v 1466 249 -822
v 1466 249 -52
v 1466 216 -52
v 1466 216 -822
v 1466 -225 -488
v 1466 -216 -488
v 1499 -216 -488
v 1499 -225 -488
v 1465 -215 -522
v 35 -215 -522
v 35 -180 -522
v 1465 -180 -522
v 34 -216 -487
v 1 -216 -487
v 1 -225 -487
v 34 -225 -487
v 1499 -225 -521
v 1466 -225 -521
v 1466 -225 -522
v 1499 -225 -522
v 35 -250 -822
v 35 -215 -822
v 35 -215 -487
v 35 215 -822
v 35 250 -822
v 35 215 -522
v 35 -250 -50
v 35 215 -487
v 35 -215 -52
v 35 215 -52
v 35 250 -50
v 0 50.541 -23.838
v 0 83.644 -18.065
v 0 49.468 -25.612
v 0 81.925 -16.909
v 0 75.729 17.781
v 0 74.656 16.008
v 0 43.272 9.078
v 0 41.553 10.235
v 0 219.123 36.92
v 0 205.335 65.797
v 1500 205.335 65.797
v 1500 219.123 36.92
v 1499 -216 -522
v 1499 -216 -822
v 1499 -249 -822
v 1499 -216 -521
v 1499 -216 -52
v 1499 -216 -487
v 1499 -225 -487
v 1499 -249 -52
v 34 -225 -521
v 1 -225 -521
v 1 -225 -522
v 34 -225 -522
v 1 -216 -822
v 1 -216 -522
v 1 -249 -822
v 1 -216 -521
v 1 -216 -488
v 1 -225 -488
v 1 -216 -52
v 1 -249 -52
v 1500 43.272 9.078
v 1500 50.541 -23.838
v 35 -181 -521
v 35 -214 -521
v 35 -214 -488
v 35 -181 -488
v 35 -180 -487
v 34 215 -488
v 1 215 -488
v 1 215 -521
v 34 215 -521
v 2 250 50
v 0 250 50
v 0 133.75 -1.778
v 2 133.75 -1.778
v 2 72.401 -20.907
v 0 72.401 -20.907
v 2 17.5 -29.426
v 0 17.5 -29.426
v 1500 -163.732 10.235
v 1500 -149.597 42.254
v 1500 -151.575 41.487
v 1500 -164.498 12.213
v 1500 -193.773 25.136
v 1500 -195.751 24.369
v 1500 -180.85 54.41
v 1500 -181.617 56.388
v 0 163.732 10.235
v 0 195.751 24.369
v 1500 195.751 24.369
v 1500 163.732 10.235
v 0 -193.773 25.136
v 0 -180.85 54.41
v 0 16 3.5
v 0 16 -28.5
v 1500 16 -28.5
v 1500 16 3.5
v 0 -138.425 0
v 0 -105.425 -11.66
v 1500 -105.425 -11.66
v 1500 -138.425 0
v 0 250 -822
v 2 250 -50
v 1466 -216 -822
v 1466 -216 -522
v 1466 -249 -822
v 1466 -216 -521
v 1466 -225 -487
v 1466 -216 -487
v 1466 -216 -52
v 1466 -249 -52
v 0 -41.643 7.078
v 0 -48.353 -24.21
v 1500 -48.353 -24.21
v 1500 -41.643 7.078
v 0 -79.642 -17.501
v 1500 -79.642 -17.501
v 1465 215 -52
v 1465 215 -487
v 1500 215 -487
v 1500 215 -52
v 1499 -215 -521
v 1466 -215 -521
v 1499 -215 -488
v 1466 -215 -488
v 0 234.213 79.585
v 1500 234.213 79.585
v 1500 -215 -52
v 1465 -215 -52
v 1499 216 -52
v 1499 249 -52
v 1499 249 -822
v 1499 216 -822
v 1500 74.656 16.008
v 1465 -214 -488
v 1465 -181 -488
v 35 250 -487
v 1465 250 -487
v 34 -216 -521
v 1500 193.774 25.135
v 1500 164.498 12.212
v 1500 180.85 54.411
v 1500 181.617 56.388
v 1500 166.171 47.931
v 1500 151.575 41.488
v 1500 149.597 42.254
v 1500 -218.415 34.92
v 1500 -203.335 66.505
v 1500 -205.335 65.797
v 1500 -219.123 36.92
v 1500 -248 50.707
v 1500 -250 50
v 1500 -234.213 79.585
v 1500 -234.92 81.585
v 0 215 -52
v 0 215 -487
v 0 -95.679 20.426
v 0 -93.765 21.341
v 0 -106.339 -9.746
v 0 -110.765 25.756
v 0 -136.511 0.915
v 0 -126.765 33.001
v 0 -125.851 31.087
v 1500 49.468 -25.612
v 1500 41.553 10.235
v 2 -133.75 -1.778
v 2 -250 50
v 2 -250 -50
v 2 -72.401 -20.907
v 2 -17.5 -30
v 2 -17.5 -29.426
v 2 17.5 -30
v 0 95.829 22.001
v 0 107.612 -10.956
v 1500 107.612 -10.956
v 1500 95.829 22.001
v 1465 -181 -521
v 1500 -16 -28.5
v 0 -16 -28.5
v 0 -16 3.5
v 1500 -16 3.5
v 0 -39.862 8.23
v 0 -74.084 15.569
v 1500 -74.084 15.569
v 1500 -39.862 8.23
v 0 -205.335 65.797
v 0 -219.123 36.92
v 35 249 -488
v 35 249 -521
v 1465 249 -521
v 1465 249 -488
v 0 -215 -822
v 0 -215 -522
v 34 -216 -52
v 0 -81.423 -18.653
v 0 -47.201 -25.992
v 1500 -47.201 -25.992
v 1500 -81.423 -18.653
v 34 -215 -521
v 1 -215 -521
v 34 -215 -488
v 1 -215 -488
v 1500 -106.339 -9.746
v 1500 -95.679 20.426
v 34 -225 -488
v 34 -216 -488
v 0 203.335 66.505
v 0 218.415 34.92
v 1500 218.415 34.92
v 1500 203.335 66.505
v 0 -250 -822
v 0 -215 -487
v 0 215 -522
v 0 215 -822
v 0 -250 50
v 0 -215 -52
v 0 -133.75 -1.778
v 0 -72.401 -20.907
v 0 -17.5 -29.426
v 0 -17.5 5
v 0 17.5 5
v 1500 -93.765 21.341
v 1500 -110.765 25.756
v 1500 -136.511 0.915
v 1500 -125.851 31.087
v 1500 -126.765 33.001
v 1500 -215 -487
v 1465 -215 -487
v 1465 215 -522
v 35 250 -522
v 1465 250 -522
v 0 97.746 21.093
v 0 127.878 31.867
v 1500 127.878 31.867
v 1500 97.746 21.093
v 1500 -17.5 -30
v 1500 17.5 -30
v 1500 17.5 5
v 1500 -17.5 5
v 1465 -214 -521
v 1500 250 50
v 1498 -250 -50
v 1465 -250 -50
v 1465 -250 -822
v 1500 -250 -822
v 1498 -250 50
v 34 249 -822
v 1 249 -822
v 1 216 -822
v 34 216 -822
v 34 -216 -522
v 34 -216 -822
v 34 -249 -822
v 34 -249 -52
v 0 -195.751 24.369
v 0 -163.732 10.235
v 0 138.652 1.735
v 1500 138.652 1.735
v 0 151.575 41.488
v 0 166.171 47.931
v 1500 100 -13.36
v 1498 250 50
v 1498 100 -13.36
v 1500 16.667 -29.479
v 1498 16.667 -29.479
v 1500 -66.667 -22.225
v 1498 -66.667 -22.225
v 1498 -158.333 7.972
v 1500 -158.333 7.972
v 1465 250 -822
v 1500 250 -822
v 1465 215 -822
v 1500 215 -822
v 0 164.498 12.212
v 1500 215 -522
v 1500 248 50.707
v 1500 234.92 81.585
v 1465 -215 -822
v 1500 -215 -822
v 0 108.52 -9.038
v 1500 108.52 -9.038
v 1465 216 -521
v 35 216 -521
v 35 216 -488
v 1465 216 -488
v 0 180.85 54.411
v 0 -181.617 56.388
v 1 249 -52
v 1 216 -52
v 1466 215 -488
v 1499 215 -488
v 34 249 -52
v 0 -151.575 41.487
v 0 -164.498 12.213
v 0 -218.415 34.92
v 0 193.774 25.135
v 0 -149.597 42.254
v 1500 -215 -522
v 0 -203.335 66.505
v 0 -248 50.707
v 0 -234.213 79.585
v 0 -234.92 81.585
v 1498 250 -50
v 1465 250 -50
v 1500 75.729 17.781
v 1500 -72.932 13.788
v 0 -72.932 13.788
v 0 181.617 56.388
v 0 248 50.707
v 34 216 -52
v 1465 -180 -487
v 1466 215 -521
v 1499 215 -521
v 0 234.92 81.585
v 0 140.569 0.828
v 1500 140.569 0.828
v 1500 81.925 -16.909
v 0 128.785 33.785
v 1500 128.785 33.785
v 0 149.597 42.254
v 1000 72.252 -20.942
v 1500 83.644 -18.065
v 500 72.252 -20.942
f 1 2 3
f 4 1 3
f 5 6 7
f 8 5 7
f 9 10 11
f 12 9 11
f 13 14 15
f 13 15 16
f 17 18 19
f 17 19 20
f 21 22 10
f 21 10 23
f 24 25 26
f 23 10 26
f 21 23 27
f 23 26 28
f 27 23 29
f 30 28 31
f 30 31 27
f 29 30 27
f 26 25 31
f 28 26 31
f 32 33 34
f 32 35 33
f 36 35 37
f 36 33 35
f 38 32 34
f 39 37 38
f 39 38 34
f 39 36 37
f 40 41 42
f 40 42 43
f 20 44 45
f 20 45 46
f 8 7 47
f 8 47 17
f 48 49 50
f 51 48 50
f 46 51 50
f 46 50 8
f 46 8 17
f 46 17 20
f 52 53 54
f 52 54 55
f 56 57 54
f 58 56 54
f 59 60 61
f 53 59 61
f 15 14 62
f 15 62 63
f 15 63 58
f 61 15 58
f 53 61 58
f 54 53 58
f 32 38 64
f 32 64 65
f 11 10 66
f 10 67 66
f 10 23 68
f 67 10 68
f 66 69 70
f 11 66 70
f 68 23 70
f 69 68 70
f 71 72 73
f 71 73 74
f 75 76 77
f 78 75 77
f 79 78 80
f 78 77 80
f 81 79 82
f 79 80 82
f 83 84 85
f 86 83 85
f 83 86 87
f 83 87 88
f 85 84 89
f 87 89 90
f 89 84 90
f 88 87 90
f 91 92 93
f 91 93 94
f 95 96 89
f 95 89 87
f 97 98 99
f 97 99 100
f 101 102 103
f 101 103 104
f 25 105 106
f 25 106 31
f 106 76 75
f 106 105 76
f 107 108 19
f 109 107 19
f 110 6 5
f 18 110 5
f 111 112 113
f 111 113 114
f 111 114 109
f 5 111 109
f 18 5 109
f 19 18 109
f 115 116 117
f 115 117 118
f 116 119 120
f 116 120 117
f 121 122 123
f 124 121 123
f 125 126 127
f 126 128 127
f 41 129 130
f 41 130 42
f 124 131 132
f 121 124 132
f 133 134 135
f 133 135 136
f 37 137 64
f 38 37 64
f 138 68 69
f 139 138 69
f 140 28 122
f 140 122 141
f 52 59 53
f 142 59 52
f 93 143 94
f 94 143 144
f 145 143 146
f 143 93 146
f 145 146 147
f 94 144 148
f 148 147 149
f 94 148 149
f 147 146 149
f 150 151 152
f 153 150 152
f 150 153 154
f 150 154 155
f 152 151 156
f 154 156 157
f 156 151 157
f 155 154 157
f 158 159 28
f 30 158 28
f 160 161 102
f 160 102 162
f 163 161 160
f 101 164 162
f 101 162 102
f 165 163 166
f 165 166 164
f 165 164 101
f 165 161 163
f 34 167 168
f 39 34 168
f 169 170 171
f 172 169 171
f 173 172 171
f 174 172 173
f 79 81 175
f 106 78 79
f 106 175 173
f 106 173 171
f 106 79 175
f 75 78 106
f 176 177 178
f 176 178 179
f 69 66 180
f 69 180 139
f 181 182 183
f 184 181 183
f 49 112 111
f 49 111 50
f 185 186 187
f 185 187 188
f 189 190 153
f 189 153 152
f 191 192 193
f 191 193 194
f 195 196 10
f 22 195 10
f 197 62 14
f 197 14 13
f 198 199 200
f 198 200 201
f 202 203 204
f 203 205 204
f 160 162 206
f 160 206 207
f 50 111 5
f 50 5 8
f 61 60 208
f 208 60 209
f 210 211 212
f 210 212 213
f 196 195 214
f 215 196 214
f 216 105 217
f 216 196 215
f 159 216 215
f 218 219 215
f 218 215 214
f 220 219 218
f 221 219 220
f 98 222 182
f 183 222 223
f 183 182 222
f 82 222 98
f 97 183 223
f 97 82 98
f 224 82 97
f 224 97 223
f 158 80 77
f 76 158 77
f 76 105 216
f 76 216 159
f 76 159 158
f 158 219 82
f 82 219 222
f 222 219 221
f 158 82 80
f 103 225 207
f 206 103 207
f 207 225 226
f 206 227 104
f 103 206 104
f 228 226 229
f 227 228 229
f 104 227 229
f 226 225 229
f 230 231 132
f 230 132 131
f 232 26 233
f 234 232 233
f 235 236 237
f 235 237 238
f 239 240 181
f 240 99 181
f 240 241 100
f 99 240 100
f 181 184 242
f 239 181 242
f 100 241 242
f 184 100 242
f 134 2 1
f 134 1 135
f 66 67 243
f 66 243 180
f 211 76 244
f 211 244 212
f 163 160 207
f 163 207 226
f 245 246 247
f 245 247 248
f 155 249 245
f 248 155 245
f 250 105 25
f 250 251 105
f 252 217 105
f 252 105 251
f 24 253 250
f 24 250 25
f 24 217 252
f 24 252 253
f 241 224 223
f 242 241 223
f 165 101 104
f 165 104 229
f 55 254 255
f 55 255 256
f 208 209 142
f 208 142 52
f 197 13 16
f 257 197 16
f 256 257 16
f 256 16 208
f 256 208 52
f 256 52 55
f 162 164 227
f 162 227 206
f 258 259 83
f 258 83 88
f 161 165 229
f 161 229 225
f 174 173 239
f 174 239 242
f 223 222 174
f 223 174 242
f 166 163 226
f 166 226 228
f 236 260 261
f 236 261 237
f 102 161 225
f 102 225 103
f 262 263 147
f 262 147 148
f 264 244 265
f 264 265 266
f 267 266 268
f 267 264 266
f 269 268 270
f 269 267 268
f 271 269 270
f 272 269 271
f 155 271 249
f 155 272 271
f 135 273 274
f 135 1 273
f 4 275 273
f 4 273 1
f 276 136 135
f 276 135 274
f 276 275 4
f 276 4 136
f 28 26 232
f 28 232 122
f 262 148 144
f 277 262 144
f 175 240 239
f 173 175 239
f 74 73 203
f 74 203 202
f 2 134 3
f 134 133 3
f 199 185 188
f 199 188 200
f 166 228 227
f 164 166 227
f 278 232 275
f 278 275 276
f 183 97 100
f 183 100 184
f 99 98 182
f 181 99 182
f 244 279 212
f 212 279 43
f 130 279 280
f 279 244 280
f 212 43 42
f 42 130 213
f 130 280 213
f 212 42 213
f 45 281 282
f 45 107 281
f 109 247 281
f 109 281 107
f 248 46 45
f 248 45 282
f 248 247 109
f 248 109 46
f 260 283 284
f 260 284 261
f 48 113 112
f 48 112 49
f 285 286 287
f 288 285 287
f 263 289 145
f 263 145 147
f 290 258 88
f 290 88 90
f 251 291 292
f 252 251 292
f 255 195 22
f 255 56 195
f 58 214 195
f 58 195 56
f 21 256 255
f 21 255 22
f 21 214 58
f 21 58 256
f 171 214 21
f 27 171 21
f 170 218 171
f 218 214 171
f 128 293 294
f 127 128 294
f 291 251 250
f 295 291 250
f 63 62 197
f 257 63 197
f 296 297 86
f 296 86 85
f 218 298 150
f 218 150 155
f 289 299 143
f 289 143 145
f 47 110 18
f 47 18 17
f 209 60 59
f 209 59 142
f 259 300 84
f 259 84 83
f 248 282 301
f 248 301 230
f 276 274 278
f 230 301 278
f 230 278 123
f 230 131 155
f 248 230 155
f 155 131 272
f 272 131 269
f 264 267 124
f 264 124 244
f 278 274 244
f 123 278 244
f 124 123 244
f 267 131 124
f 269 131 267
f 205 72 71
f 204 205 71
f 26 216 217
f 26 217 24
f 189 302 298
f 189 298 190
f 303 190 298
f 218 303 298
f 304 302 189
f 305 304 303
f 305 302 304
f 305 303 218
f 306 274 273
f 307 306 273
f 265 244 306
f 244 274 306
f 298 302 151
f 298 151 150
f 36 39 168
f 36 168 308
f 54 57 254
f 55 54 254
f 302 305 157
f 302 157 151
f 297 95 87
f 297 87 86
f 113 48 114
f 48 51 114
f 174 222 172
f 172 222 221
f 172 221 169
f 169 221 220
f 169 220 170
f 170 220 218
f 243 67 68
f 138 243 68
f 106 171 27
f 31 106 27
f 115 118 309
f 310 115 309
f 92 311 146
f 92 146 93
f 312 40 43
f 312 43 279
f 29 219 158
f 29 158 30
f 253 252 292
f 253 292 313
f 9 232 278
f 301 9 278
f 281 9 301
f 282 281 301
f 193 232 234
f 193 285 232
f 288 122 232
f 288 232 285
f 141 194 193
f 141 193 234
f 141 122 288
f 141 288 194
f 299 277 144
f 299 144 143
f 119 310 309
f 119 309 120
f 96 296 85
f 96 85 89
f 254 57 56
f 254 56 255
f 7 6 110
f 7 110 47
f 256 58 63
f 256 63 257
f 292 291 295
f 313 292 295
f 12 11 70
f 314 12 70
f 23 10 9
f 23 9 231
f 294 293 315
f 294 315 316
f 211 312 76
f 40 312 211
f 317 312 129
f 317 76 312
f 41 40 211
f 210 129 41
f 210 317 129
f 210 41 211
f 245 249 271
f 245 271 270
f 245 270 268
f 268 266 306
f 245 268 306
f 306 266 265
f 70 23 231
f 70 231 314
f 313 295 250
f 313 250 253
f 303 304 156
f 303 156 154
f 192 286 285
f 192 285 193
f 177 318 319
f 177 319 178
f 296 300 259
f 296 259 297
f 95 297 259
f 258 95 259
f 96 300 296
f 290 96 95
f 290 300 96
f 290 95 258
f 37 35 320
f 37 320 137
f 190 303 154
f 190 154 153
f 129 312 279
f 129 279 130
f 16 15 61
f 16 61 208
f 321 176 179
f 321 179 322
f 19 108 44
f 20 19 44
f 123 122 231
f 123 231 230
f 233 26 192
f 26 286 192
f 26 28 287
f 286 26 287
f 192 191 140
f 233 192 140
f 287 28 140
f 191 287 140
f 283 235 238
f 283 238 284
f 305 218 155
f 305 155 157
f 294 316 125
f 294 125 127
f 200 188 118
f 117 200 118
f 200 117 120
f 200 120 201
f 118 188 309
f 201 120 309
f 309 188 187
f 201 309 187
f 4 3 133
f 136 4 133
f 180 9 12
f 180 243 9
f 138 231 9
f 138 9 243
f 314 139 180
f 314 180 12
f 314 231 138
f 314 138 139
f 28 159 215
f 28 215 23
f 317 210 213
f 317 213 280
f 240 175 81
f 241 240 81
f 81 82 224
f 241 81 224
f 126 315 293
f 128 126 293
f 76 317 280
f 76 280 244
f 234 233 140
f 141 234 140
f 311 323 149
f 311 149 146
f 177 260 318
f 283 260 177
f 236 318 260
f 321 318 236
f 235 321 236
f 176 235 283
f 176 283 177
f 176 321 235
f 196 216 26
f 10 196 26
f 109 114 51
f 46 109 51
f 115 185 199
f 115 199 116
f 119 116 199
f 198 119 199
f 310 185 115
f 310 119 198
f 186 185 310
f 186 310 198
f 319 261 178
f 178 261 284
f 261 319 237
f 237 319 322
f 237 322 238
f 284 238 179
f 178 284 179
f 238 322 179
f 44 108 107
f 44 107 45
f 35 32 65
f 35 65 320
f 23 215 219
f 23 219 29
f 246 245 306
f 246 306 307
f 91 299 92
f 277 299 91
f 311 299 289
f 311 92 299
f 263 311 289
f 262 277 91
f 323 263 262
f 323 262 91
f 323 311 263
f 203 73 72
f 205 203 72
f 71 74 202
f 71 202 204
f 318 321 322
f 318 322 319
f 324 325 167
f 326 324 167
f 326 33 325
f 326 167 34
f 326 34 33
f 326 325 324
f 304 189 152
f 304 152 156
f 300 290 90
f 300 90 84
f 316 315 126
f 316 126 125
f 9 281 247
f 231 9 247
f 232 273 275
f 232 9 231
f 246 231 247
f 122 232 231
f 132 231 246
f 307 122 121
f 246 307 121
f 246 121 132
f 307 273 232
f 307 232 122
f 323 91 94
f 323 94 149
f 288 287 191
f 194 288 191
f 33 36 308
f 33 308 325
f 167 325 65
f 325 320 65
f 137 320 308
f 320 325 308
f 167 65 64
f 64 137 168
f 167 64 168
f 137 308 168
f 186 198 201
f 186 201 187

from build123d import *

# Parameters (mm, degrees)
F1_DEPTH  = 2
F2_W      = 35
F2_H      = 500
F3_DEPTH  = 2
F6_W      = 35
F6_H      = 35
F6_W_2    = 32
F6_H_2    = 32
F7_DEPTH  = 1500
F9_DEPTH  = 1500
F11_DEPTH = 1500
F13_DEPTH = 1500
F14_W     = 35
F14_H     = 35
F14_W_2   = 33
F14_H_2   = 33
F15_DEPTH = 770
F16_W     = 35
F16_H     = 35
F16_W_2   = 33
F16_H_2   = 33
F17_DEPTH = 770
F18_W     = 35
F18_H     = 35
F18_W_2   = 33
F18_H_2   = 33
F19_DEPTH = 440
F20_W     = 35
F20_H     = 35
F20_W_2   = 33
F20_H_2   = 33
F21_DEPTH = 440
F22_W     = 35
F22_H     = 35
F22_W_2   = 33
F22_H_2   = 33
F23_DEPTH = 1430
F24_W     = 35
F24_H     = 35
F24_W_2   = 33
F24_H_2   = 33
F25_DEPTH = 1430


with BuildPart() as f1:
    # F0 (on Right) → F1 (new body)
    with BuildSketch(Plane.YZ):
        with BuildLine():
            Line((-250, 50), (-250, -50))
            Line((-250, -50), (250, -50))
            Line((250, -50), (250, 50))
            add(Edge.make_bspline(
                [(250, 50), (166.6666666667, 10), (0, -70), (-166.6666666667, 10), (-250, 50)],
                knots=[0, 0, 0, 0, 0.5, 1, 1, 1, 1], degree=3))
        make_face()
    extrude(amount=F1_DEPTH)

    # F2 (on face) → F3 (join)
    with BuildSketch(Plane(origin=(0, 0, -50), x_dir=(1, 0, 0), z_dir=(0, 0, -1))):
        with Locations((17.5, 0)):
            Rectangle(F2_W, F2_H)
    extrude(amount=F3_DEPTH)


with BuildPart() as f4_1:
    # F4: instance of F1
    add(f1.part.mirror(Plane(origin=(35, 0, -51), x_dir=(0, 1, 0), z_dir=(1, 0, 0))))


with BuildPart() as f4_1_1:
    # F5: moved
    add(f4_1.part.moved(Location((1430, 0, 0))))

    # F16 (on face) → F17 (join)
    with BuildSketch(Plane(origin=(0, 0, -52), x_dir=(1, 0, 0), z_dir=(0, 0, -1))):
        with Locations((1482.5, 232.5)):
            Rectangle(F16_W, F16_H)
        with Locations((1482.5, 232.5)):
            Rectangle(F16_W_2, F16_H_2, mode=Mode.SUBTRACT)
        with Locations((1482.5, -232.5)):
            Rectangle(F16_W, F16_H)
        with Locations((1482.5, -232.5)):
            Rectangle(F16_W_2, F16_H_2, mode=Mode.SUBTRACT)
    extrude(amount=F17_DEPTH)

    # F18 (on face) → F19 (join)
    with BuildSketch(Plane.XZ.offset(-215)):
        with Locations((1482.5, -504.5)):
            Rectangle(F18_W, F18_H)
        with Locations((1482.5, -504.5)):
            Rectangle(F18_W_2, F18_H_2, mode=Mode.SUBTRACT)
    extrude(amount=F19_DEPTH)


with BuildPart() as f1_1:
    add(f1.part)

    # F6 (on face) → F7 (join)
    with BuildSketch(Plane(origin=(0, 0, 0), x_dir=(0, -1, 0), z_dir=(-1, 0, 0))):
        with Locations((0, -12.5)):
            Rectangle(F6_W, F6_H)
        with Locations((0, -12.5)):
            Rectangle(F6_W_2, F6_H_2, mode=Mode.SUBTRACT)
    extrude(amount=-F7_DEPTH)

    # F14 (on face) → F15 (join)
    with BuildSketch(Plane(origin=(0, 0, -52), x_dir=(1, 0, 0), z_dir=(0, 0, -1))):
        with Locations((17.5, 232.5)):
            Rectangle(F14_W, F14_H)
        with Locations((17.5, 232.5)):
            Rectangle(F14_W_2, F14_H_2, mode=Mode.SUBTRACT)
        with Locations((17.5, -232.5)):
            Rectangle(F14_W, F14_H)
        with Locations((17.5, -232.5)):
            Rectangle(F14_W_2, F14_H_2, mode=Mode.SUBTRACT)
    extrude(amount=F15_DEPTH)

    # F20 (on face) → F21 (join)
    with BuildSketch(Plane.XZ.offset(-215)):
        with Locations((17.5, -504.5)):
            Rectangle(F20_W, F20_H)
        with Locations((17.5, -504.5)):
            Rectangle(F20_W_2, F20_H_2, mode=Mode.SUBTRACT)
    extrude(amount=F21_DEPTH)


with BuildPart() as f9:
    # F8 (on face) → F9 (new body)
    with BuildSketch(Plane(origin=(0, 0, 0), x_dir=(0, -1, 0), z_dir=(-1, 0, 0))):
        Polygon((-234.9200030965, 81.5847066377), (-250, 50), (-218.4152933623, 34.9200030965), (-203.3352964588, 66.5047097342), align=None)
        Polygon((-234.2126583936, 79.5847907717), (-219.7739353592, 72.6910779015), (-205.3352123248, 65.7973650313), (-219.1226380652, 36.9199189626), (-248.0000841339, 50.7073447029), align=None, mode=Mode.SUBTRACT)
    extrude(amount=-F9_DEPTH)


with BuildPart() as f11:
    # F10 (on face) → F11 (new body)
    with BuildSketch(Plane(origin=(0, 0, 0), x_dir=(0, -1, 0), z_dir=(-1, 0, 0))):
        with BuildLine():
            add(Edge.make_bspline(
                [(-83.6444792813, -18.0650520534), (-72.2522280284, -21.1120515617), (-60.8599767755, -23.6616132493), (-49.4677255225, -25.6115414701)],
                knots=[0.3327110414, 0.3327110414, 0.3327110414, 0.3327110414, 0.401064549, 0.401064549, 0.401064549, 0.401064549], degree=3))
            Line((-49.4677255225, -25.6115414701), (-41.5525741961, 10.2348187258))
            Line((-41.5525741961, 10.2348187258), (-75.7293279548, 17.7813081425))
            Line((-75.7293279548, 17.7813081425), (-83.6444792813, -18.0650520534))
        make_face()
        Polygon((-74.6562526953, 16.0082330425), (-58.9643720505, 12.5433454159), (-43.2724914057, 9.0784577893), (-50.5408007821, -23.8384663701), (-81.9245620717, -16.9086911169), align=None, mode=Mode.SUBTRACT)
    extrude(amount=-F11_DEPTH)


with BuildPart() as f11b:
    # F10 (on face) → F11, piece 2 (new body)
    with BuildSketch(Plane(origin=(0, 0, 0), x_dir=(0, -1, 0), z_dir=(-1, 0, 0))):
        Polygon((-140.569047312, 0.8278953682), (-107.6123605236, -10.955855984), (-95.8286091714, 22.0008308044), (-128.7852959598, 33.7845821566), align=None)
        Polygon((-127.8778844411, 31.8671348077), (-112.8119704807, 26.4802770467), (-97.7460565203, 21.0934192857), (-108.5197720423, -9.0384086351), (-138.6515999631, 1.7353068869), align=None, mode=Mode.SUBTRACT)
    extrude(amount=-F11_DEPTH)


with BuildPart() as f11c:
    # F10 (on face) → F11, piece 3 (new body)
    with BuildSketch(Plane(origin=(0, 0, 0), x_dir=(0, -1, 0), z_dir=(-1, 0, 0))):
        Polygon((-195.7508154323, 24.3691054968), (-163.7317283517, 10.2348187258), (-149.5974415807, 42.2539058064), (-181.6165286613, 56.3881925774), align=None)
        Polygon((-180.8503805606, 54.4110768645), (-166.1714005224, 47.9312883295), (-151.5745572935, 41.4877577057), (-164.4978764523, 12.2119344387), (-193.7736997194, 25.1352535974), align=None, mode=Mode.SUBTRACT)
    extrude(amount=-F11_DEPTH)


with BuildPart() as f13:
    # F12 (on face) → F13 (new body)
    with BuildSketch(Plane(origin=(0, 0, 0), x_dir=(0, -1, 0), z_dir=(-1, 0, 0))):
        Polygon((218.4152933623, 34.9200030965), (250, 50), (234.9200030965, 81.5847066377), (203.3352964588, 66.5047097342), align=None)
        Polygon((205.3352123248, 65.7973650313), (219.7739353592, 72.6910779015), (234.2126583936, 79.5847907717), (248.0000841339, 50.7073447029), (219.1226380652, 36.9199189626), align=None, mode=Mode.SUBTRACT)
    extrude(amount=-F13_DEPTH)


with BuildPart() as f13b:
    # F12 (on face) → F13, piece 2 (new body)
    with BuildSketch(Plane(origin=(0, 0, 0), x_dir=(0, -1, 0), z_dir=(-1, 0, 0))):
        Polygon((163.7317283517, 10.2348187258), (195.7508154323, 24.3691054968), (181.6165286613, 56.3881925774), (149.5974415807, 42.2539058064), align=None)
        Polygon((151.5754433172, 41.4874143645), (166.2127402683, 47.9488026027), (180.8500372194, 54.4101908409), (193.7728136958, 25.1355969386), (164.4982197935, 12.2128204623), align=None, mode=Mode.SUBTRACT)
    extrude(amount=-F13_DEPTH)


with BuildPart() as f13c:
    # F12 (on face) → F13, piece 3 (new body)
    with BuildSketch(Plane(origin=(0, 0, 0), x_dir=(0, -1, 0), z_dir=(-1, 0, 0))):
        Polygon((105.4247818059, -11.6600143596), (138.4254494527, 0), (126.7654350931, 33.0006676468), (93.7647674463, 21.3406532872), align=None)
        Polygon((95.6787966751, 20.4260538606), (110.7648161708, 25.7563461393), (125.8508356665, 31.0866384179), (136.5114202239, 0.9145994266), (106.3393812325, -9.7459851308), align=None, mode=Mode.SUBTRACT)
    extrude(amount=-F13_DEPTH)


with BuildPart() as f13d:
    # F12 (on face) → F13, piece 4 (new body)
    with BuildSketch(Plane(origin=(0, 0, 0), x_dir=(0, -1, 0), z_dir=(-1, 0, 0))):
        Polygon((47.200742599, -25.9916196732), (81.4227235681, -18.6529536807), (74.0840575757, 15.5690272884), (39.8620766065, 8.230361296), align=None)
        Polygon((41.6432471906, 7.0782192255), (57.2875813479, 10.4330379649), (72.9319155052, 13.7878567043), (79.641552984, -17.5008116103), (48.3528846694, -24.2104490891), align=None, mode=Mode.SUBTRACT)
    extrude(amount=-F13_DEPTH)


with BuildPart() as f23:
    # F22 (on face) → F23 (new body)
    with BuildSketch(Plane.YZ.offset(35)):
        with Locations((232.5, -504.5)):
            Rectangle(F22_W, F22_H)
        with Locations((232.5, -504.5)):
            Rectangle(F22_W_2, F22_H_2, mode=Mode.SUBTRACT)
    extrude(amount=F23_DEPTH)


with BuildPart() as f25:
    # F24 (on face) → F25 (new body)
    with BuildSketch(Plane.YZ.offset(35)):
        with Locations((-197.5, -504.5)):
            Rectangle(F24_W, F24_H)
        with Locations((-197.5, -504.5)):
            Rectangle(F24_W_2, F24_H_2, mode=Mode.SUBTRACT)
    extrude(amount=F25_DEPTH)


solid = Compound([f4_1_1.part, f1_1.part, f9.part, f11.part, f11b.part, f11c.part, f13.part, f13b.part, f13c.part, f13d.part, f23.part, f25.part])
